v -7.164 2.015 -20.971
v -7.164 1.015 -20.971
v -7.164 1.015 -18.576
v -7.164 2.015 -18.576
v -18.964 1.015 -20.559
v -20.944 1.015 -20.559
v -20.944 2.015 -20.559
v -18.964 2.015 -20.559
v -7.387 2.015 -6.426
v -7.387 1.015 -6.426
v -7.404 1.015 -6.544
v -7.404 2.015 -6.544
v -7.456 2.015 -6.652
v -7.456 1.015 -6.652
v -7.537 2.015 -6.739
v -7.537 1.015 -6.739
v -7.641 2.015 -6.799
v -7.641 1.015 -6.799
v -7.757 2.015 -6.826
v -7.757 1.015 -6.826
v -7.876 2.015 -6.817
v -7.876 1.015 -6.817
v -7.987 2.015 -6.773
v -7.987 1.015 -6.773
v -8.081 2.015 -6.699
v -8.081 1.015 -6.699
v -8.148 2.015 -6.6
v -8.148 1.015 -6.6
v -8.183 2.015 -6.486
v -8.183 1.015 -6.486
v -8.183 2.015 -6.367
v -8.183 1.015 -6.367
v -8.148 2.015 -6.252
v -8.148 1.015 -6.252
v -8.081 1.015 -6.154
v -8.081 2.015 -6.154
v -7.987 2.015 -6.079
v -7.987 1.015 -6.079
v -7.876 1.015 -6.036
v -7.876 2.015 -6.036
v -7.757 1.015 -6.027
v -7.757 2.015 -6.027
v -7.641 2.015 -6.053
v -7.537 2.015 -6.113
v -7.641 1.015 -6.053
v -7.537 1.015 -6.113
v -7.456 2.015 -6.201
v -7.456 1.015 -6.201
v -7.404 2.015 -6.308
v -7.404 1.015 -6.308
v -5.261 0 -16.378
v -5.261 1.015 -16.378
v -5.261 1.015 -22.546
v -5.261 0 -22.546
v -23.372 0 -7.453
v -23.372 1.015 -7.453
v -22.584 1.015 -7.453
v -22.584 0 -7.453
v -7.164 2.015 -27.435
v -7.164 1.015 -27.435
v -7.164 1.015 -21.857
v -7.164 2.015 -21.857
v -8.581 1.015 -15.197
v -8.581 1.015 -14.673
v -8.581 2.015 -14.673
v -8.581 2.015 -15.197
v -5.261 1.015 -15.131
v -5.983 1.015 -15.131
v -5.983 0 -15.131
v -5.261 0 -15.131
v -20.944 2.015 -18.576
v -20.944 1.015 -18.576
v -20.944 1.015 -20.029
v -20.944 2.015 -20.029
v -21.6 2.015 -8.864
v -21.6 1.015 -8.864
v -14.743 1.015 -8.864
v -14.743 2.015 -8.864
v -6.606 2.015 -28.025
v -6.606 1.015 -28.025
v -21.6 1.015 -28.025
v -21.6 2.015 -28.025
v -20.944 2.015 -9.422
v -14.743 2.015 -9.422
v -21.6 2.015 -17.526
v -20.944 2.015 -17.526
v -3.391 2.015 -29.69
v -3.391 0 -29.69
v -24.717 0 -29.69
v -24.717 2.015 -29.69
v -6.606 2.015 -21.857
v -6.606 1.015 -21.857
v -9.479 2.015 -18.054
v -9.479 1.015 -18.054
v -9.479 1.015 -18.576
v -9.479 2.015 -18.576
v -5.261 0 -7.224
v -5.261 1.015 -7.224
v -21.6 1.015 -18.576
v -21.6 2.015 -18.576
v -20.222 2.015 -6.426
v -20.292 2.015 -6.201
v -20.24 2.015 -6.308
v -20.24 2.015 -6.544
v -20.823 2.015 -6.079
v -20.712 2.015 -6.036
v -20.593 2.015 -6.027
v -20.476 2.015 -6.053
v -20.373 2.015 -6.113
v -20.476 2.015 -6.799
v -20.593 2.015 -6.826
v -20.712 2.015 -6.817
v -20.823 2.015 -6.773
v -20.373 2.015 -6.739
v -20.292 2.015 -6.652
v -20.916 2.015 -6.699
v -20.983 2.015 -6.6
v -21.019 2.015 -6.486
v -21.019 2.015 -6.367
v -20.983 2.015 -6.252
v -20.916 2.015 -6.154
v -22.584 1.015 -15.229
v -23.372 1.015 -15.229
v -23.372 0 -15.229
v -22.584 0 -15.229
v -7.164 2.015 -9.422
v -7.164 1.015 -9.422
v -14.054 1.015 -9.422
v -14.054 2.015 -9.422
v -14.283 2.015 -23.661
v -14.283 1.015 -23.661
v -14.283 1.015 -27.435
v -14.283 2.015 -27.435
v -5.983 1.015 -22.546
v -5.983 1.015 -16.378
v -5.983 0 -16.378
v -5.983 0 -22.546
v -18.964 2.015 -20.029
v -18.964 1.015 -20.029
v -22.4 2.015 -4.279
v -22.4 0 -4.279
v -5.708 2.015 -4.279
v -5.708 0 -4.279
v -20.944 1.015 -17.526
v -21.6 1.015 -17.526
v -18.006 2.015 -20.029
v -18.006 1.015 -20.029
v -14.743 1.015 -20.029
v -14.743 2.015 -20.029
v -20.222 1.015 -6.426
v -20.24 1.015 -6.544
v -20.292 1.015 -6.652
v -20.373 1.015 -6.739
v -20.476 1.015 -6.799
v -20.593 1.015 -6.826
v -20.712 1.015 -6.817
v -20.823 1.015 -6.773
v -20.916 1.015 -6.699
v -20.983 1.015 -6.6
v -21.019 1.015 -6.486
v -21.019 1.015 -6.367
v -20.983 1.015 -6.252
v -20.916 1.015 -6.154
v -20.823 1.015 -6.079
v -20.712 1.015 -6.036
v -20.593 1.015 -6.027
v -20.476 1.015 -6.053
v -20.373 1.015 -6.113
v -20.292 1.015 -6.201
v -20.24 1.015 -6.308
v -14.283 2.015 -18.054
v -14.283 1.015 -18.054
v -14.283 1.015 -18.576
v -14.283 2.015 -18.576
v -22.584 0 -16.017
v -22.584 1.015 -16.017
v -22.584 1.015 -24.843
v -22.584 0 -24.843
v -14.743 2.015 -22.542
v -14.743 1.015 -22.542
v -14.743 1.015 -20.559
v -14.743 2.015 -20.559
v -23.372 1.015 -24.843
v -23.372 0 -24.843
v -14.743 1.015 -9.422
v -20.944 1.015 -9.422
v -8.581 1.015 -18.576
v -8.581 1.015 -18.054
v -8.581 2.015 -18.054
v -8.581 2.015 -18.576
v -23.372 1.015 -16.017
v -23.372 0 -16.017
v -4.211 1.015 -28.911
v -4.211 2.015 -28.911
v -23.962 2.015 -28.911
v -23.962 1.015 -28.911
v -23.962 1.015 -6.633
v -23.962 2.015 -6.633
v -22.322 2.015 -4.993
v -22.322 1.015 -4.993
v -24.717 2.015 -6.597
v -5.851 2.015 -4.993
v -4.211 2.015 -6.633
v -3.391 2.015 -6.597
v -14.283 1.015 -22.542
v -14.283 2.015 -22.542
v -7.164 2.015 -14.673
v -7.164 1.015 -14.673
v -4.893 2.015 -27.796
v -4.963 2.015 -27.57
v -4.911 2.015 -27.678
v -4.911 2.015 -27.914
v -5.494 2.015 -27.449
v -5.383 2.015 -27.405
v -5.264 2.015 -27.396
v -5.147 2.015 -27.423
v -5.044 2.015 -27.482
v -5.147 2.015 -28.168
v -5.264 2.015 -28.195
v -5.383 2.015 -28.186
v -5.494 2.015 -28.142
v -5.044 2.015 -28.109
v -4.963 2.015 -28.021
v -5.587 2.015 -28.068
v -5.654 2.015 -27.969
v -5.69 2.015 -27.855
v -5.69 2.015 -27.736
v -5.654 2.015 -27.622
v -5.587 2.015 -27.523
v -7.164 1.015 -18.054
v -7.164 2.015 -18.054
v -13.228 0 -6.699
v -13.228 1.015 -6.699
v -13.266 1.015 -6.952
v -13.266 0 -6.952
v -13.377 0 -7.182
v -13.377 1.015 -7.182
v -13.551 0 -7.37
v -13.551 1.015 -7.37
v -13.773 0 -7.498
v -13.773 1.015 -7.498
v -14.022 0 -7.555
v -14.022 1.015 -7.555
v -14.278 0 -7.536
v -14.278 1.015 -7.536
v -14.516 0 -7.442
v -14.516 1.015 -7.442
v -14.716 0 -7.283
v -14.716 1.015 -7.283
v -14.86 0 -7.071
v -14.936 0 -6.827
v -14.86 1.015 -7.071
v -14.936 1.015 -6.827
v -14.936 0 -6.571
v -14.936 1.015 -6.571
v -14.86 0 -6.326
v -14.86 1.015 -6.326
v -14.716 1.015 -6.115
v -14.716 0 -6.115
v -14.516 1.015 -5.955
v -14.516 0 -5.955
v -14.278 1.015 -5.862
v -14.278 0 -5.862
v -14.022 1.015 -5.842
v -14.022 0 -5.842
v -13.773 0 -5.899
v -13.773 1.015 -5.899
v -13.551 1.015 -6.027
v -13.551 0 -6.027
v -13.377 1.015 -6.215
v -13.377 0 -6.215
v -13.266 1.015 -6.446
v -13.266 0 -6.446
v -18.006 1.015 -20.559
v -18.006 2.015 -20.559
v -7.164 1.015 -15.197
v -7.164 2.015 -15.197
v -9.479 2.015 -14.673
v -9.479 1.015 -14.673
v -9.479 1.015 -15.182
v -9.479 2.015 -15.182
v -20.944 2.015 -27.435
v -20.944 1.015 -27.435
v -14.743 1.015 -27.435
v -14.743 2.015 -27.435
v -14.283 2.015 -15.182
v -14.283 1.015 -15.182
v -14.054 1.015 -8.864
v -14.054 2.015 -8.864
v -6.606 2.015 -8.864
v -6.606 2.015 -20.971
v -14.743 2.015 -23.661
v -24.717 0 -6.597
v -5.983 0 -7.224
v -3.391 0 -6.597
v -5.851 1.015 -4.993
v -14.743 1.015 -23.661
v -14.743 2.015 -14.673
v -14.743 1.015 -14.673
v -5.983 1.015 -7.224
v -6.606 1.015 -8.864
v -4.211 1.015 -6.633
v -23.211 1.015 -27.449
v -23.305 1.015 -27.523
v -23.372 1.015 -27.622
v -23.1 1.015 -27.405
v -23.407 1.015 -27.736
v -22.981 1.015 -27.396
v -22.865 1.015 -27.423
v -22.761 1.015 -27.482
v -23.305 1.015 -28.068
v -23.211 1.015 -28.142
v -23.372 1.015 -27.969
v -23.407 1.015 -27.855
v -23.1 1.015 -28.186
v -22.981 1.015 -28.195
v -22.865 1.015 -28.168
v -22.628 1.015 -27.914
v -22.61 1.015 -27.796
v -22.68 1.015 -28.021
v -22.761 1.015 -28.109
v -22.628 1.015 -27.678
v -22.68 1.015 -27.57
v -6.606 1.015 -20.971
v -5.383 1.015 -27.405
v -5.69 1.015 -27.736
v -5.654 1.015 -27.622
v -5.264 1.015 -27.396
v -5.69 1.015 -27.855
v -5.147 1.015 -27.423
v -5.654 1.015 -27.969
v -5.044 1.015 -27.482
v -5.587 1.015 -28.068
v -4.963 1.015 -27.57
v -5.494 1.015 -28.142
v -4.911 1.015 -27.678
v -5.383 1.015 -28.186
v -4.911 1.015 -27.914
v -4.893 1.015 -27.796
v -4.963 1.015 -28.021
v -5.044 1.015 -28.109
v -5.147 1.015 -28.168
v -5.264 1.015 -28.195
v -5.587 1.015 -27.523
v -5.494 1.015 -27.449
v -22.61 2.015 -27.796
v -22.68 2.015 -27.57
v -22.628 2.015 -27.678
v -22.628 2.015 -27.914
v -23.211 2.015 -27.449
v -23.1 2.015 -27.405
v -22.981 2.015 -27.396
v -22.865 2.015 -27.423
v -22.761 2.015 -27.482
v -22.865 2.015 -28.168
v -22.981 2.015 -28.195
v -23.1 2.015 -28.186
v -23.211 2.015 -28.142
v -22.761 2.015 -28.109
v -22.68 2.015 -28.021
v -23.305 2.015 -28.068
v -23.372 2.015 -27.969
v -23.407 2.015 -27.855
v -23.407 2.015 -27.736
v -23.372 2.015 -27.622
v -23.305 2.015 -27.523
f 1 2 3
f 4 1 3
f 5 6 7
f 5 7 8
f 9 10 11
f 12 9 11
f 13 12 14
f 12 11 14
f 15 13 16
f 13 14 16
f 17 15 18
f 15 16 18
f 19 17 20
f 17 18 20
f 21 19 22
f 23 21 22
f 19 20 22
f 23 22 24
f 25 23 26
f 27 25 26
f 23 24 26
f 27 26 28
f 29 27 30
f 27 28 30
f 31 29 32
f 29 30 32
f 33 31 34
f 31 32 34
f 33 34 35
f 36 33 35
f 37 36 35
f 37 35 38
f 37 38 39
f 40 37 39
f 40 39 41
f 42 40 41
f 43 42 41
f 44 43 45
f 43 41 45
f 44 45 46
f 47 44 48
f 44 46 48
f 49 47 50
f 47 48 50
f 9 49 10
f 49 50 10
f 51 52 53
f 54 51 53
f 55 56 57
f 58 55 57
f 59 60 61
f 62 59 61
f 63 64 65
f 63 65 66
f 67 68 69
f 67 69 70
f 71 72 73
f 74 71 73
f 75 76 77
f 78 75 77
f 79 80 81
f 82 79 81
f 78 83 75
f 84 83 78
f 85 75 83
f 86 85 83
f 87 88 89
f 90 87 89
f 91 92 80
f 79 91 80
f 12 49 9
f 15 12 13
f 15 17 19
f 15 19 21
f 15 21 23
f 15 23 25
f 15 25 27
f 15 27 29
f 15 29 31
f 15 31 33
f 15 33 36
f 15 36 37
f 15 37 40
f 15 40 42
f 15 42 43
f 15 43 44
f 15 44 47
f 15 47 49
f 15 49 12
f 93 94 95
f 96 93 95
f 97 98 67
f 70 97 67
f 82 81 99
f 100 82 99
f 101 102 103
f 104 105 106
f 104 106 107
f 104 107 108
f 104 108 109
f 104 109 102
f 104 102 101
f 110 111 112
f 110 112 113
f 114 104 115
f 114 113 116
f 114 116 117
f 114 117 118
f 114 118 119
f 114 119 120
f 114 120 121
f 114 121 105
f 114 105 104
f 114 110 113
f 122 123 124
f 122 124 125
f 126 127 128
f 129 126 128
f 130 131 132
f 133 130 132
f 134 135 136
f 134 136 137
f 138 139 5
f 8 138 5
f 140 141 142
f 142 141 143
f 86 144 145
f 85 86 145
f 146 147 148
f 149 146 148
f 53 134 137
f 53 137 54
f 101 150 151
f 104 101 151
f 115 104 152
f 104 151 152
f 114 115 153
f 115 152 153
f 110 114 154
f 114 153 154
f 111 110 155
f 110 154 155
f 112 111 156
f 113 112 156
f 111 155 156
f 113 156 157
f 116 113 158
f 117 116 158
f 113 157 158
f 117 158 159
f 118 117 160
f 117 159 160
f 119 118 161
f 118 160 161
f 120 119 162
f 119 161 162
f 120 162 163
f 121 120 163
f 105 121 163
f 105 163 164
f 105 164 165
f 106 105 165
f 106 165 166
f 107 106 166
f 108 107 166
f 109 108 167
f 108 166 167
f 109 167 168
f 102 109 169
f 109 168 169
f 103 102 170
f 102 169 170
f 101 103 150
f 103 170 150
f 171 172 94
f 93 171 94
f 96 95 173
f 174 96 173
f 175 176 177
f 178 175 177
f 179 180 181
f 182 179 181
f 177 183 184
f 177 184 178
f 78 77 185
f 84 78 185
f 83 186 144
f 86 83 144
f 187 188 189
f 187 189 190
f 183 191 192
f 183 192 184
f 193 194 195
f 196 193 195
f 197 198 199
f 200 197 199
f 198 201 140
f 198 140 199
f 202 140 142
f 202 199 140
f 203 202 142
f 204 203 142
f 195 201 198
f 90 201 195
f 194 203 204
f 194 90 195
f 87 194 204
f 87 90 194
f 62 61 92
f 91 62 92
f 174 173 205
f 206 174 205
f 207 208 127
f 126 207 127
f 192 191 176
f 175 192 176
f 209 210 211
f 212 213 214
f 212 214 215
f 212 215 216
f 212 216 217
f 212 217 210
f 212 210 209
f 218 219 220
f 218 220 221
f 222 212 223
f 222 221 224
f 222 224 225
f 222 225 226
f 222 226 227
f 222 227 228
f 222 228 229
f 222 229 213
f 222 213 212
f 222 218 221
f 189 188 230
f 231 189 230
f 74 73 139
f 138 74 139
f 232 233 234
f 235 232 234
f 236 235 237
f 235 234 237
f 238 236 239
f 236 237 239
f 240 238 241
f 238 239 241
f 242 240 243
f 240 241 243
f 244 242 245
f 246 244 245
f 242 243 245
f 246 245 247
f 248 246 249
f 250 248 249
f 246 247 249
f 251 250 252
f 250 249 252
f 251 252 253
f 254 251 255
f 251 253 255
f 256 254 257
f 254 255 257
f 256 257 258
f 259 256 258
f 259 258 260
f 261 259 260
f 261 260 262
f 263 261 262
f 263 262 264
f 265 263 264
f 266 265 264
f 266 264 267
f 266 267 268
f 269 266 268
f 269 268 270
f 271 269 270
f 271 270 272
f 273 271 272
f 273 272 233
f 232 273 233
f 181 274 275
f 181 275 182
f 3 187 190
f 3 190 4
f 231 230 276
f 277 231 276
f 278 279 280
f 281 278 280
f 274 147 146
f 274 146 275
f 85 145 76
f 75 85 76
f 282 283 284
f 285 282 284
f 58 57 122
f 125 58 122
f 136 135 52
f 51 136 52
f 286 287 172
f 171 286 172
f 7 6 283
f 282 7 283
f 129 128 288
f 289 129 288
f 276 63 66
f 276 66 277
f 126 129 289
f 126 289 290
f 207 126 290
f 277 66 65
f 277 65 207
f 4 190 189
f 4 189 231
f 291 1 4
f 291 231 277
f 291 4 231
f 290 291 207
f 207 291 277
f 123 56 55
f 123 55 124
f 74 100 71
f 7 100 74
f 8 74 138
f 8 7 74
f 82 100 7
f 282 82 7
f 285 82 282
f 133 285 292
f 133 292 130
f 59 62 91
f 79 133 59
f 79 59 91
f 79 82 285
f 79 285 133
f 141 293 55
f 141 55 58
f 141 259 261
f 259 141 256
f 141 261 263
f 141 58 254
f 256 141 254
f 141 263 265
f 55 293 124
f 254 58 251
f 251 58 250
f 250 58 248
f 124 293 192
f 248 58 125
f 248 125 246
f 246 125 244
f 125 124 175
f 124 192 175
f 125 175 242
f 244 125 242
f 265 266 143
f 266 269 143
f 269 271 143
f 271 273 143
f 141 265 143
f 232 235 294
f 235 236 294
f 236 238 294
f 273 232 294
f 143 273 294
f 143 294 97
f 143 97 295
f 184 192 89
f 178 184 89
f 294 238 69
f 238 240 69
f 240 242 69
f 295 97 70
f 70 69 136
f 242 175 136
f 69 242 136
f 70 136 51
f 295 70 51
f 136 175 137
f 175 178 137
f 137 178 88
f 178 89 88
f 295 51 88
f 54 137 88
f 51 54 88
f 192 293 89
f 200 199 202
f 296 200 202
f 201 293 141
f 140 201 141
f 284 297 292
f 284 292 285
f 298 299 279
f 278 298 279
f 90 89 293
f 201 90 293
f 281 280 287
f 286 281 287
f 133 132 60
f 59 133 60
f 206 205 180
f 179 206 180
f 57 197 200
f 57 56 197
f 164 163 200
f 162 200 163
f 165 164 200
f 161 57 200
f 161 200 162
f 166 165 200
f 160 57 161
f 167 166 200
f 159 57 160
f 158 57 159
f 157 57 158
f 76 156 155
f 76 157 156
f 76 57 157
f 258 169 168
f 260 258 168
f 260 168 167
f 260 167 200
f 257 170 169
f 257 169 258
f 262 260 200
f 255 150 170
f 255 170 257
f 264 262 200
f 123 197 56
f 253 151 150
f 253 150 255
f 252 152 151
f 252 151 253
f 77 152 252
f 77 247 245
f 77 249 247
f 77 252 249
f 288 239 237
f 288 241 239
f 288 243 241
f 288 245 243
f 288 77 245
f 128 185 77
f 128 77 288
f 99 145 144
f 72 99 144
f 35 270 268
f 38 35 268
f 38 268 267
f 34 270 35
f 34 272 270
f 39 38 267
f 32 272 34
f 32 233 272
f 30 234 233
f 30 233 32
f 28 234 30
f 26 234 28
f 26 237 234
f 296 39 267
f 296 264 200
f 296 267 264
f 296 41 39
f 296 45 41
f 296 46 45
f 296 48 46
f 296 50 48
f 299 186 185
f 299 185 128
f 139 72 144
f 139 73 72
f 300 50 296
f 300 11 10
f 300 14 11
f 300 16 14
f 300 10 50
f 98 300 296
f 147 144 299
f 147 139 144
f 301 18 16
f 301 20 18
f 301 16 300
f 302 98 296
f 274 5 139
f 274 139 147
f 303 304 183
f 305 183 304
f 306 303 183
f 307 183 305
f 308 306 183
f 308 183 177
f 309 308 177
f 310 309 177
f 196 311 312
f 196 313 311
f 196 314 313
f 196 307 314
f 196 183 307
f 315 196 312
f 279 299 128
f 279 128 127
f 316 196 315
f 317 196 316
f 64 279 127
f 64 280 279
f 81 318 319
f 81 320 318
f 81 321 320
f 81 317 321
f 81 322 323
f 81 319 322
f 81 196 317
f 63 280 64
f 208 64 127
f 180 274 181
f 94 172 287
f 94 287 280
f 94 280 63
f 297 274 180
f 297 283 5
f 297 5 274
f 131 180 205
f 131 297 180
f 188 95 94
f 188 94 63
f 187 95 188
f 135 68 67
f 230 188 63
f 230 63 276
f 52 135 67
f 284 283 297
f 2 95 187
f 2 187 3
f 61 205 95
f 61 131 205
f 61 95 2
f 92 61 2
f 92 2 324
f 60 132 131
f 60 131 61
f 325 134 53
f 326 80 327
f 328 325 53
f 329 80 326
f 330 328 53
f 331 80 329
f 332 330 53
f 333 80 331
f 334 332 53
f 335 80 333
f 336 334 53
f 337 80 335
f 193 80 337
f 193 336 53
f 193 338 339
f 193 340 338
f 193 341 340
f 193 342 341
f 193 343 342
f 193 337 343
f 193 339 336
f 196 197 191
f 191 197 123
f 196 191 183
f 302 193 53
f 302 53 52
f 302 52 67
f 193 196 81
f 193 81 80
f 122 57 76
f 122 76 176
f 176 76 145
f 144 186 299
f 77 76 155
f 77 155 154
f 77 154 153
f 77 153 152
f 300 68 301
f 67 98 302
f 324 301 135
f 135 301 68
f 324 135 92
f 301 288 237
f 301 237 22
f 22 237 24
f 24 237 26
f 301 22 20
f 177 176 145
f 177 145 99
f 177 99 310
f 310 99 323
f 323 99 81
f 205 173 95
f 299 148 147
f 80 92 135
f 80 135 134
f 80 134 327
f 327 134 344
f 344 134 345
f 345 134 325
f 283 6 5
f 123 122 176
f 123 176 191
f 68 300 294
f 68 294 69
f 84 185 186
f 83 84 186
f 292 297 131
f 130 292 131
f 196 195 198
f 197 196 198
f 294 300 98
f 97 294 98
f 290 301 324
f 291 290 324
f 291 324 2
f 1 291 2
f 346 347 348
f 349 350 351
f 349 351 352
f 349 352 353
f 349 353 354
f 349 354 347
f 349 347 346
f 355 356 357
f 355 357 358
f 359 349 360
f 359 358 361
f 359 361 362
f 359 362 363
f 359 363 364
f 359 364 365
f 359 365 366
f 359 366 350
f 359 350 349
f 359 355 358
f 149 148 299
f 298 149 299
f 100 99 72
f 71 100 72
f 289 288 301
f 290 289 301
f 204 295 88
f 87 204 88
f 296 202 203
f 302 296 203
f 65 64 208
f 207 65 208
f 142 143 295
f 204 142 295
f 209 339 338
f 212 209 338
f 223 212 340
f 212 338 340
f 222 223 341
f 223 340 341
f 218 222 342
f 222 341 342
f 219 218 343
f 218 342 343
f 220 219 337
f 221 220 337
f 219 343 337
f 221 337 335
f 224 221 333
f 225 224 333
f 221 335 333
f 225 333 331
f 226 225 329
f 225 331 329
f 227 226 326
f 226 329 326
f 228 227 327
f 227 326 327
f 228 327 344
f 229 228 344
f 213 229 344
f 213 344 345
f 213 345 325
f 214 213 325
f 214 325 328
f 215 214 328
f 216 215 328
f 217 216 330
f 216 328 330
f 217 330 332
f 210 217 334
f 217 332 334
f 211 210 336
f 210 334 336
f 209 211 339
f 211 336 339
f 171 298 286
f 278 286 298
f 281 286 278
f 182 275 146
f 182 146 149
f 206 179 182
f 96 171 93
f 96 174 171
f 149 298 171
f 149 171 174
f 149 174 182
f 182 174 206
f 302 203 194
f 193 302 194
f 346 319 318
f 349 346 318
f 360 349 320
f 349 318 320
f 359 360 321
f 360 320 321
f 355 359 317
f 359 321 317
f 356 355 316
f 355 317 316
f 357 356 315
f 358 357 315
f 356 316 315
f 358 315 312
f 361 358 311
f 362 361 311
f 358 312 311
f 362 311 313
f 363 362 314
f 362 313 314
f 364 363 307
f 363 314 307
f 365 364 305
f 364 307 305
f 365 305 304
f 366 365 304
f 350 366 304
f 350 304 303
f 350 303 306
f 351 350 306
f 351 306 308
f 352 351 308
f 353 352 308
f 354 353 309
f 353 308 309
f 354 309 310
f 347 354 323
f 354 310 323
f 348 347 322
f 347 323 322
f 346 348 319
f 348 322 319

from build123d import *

# Parameters (mm, degrees)
BOSS_EXTRUDE1_DEPTH = 2.015360823
CUT_EXTRUDE4_DEPTH  = 1
SKETCH14_W          = 0.787440713
SKETCH14_H          = 8.825897992
SKETCH14_H_2        = 7.775977042
SKETCH14_W_2        = 0.721820654
SKETCH14_H_3        = 6.168285585
SKETCH14_H_4        = 7.907217161
CUT_EXTRUDE8_DEPTH  = 2
SKETCH16_R          = 0.858720655
CUT_EXTRUDE9_DEPTH  = 2
SKETCH17_W          = 1.980286876
SKETCH17_H          = 0.530178386
SKETCH17_W_2        = 0.459340416
SKETCH17_H_2        = 3.773153417
SKETCH17_W_3        = 1.417450885
SKETCH17_H_3        = 0.52338797
SKETCH17_H_4        = 0.521784595
SKETCH17_W_4        = 3.263347093
BOSS_EXTRUDE5_DEPTH = 1
SKETCH18_R          = 0.400497452
BOSS_EXTRUDE6_DEPTH = 1


with BuildPart() as part:
    # Sketch1 → Boss-Extrude1 (new body)
    with BuildSketch(Plane(origin=(0, 0, 0), x_dir=(1, 0, 0), z_dir=(0, 1, 0))):
        Polygon((-24.716746523, 29.689845928), (-24.716746523, 27.490492708), (-24.716746523, 6.596637121), (-22.39957081, 4.279461407), (-5.708050839, 4.279461407), (-3.390875125, 6.596637121), (-3.390875125, 29.689845928), align=None)
    extrude(amount=BOSS_EXTRUDE1_DEPTH)

    # Sketch13 → Cut-Extrude4 (cut)
    with BuildSketch(Plane(origin=(0, 2.015360823, 0), x_dir=(1, 0, 0), z_dir=(0, 1, 0))):
        Polygon((-23.962439797, 28.911099467), (-23.962439797, 6.633089294), (-22.321938311, 4.992587808), (-5.851303397, 4.992587808), (-4.210801911, 6.633089294), (-4.210801911, 28.911099467), align=None)
    extrude(amount=-CUT_EXTRUDE4_DEPTH, mode=Mode.SUBTRACT)

    # Sketch14 → Cut-Extrude8 (cut)
    with BuildSketch(Plane(origin=(0, 1.015360823, 0), x_dir=(1, 0, 0), z_dir=(0, 1, 0))):
        with Locations((-22.978138906, 20.429706787)):
            Rectangle(SKETCH14_W, SKETCH14_H)
        with Locations((-22.978138906, 11.341328557)):
            Rectangle(SKETCH14_W, SKETCH14_H_2)
        with Locations((-5.621633189, 19.461810911)):
            Rectangle(SKETCH14_W_2, SKETCH14_H_3)
        with Locations((-5.621633189, 11.177278409)):
            Rectangle(SKETCH14_W_2, SKETCH14_H_4)
    extrude(amount=-CUT_EXTRUDE8_DEPTH, mode=Mode.SUBTRACT)

    # Sketch16 → Cut-Extrude9 (cut)
    with BuildSketch(Plane(origin=(0, 1.015360823, 0), x_dir=(1, 0, 0), z_dir=(0, 1, 0))):
        with Locations((-14.086620854, 6.698709353)):
            Circle(SKETCH16_R)
    extrude(amount=-CUT_EXTRUDE9_DEPTH, mode=Mode.SUBTRACT)

    # Sketch17 → Boss-Extrude5 (add)
    with BuildSketch(Plane(origin=(0, 1.015360823, 0), x_dir=(1, 0, 0), z_dir=(0, 1, 0))):
        Polygon((-6.60593408, 28.025228665), (-21.600117658, 28.025228665), (-21.600117658, 18.575940108), (-20.943917063, 18.575940108), (-20.943917063, 20.028920156), (-20.943917063, 20.559098542), (-20.943917063, 27.43464813), (-14.742821448, 27.43464813), (-14.283481032, 27.43464813), (-7.163704585, 27.43464813), (-7.163704585, 21.856943079), (-6.60593408, 21.856943079), align=None)
        with Locations((-19.953773625, 20.294009349)):
            Rectangle(SKETCH17_W, SKETCH17_H)
        with Locations((-14.51315124, 25.548071422)):
            Rectangle(SKETCH17_W_2, SKETCH17_H_2)
        Polygon((-20.943917063, 17.526019157), (-21.600117658, 17.526019157), (-21.600117658, 8.864171314), (-14.742821448, 8.864171314), (-14.742821448, 9.421941819), (-20.943917063, 9.421941819), align=None)
        Polygon((-7.163704585, 9.421941819), (-14.053810824, 9.421941819), (-14.053810824, 8.864171314), (-6.60593408, 8.864171314), (-6.60593408, 20.971072277), (-7.163704585, 20.971072277), (-7.163704585, 18.575940108), (-7.163704585, 18.054155513), (-7.163704585, 15.196507048), (-7.163704585, 14.673119078), align=None)
        with Locations((-7.872430028, 14.934813063)):
            Rectangle(SKETCH17_W_3, SKETCH17_H_3)
        with Locations((-7.872430028, 18.315047811)):
            Rectangle(SKETCH17_W_3, SKETCH17_H_4)
        Polygon((-14.283481032, 22.542256975), (-14.742821448, 22.542256975), (-14.742821448, 20.559098542), (-14.742821448, 20.028920156), (-14.742821448, 18.054155513), (-14.283481032, 18.054155513), (-9.478775763, 18.054155513), (-9.478775763, 18.575940108), (-14.283481032, 18.575940108), align=None)
        with Locations((-16.374494995, 20.294009349)):
            Rectangle(SKETCH17_W_4, SKETCH17_H)
        Polygon((-14.283481032, 18.054155513), (-14.742821448, 18.054155513), (-14.742821448, 14.673119078), (-9.478775763, 14.673119078), (-9.478775763, 15.181770577), (-14.283481032, 15.181770577), align=None)
    extrude(amount=BOSS_EXTRUDE5_DEPTH)

    # Sketch18 → Boss-Extrude6 (add)
    with BuildSketch(Plane(origin=(0, 1.015360823, 0), x_dir=(1, 0, 0), z_dir=(0, 1, 0))):
        with Locations((-23.010948935, 27.795558457)):
            Circle(SKETCH18_R)
        with Locations((-20.622593862, 6.426229891)):
            Circle(SKETCH18_R)
        with Locations((-5.293532892, 27.795558457)):
            Circle(SKETCH18_R)
        with Locations((-7.78709515, 6.426229891)):
            Circle(SKETCH18_R)
    extrude(amount=BOSS_EXTRUDE6_DEPTH)


solid = part.part
